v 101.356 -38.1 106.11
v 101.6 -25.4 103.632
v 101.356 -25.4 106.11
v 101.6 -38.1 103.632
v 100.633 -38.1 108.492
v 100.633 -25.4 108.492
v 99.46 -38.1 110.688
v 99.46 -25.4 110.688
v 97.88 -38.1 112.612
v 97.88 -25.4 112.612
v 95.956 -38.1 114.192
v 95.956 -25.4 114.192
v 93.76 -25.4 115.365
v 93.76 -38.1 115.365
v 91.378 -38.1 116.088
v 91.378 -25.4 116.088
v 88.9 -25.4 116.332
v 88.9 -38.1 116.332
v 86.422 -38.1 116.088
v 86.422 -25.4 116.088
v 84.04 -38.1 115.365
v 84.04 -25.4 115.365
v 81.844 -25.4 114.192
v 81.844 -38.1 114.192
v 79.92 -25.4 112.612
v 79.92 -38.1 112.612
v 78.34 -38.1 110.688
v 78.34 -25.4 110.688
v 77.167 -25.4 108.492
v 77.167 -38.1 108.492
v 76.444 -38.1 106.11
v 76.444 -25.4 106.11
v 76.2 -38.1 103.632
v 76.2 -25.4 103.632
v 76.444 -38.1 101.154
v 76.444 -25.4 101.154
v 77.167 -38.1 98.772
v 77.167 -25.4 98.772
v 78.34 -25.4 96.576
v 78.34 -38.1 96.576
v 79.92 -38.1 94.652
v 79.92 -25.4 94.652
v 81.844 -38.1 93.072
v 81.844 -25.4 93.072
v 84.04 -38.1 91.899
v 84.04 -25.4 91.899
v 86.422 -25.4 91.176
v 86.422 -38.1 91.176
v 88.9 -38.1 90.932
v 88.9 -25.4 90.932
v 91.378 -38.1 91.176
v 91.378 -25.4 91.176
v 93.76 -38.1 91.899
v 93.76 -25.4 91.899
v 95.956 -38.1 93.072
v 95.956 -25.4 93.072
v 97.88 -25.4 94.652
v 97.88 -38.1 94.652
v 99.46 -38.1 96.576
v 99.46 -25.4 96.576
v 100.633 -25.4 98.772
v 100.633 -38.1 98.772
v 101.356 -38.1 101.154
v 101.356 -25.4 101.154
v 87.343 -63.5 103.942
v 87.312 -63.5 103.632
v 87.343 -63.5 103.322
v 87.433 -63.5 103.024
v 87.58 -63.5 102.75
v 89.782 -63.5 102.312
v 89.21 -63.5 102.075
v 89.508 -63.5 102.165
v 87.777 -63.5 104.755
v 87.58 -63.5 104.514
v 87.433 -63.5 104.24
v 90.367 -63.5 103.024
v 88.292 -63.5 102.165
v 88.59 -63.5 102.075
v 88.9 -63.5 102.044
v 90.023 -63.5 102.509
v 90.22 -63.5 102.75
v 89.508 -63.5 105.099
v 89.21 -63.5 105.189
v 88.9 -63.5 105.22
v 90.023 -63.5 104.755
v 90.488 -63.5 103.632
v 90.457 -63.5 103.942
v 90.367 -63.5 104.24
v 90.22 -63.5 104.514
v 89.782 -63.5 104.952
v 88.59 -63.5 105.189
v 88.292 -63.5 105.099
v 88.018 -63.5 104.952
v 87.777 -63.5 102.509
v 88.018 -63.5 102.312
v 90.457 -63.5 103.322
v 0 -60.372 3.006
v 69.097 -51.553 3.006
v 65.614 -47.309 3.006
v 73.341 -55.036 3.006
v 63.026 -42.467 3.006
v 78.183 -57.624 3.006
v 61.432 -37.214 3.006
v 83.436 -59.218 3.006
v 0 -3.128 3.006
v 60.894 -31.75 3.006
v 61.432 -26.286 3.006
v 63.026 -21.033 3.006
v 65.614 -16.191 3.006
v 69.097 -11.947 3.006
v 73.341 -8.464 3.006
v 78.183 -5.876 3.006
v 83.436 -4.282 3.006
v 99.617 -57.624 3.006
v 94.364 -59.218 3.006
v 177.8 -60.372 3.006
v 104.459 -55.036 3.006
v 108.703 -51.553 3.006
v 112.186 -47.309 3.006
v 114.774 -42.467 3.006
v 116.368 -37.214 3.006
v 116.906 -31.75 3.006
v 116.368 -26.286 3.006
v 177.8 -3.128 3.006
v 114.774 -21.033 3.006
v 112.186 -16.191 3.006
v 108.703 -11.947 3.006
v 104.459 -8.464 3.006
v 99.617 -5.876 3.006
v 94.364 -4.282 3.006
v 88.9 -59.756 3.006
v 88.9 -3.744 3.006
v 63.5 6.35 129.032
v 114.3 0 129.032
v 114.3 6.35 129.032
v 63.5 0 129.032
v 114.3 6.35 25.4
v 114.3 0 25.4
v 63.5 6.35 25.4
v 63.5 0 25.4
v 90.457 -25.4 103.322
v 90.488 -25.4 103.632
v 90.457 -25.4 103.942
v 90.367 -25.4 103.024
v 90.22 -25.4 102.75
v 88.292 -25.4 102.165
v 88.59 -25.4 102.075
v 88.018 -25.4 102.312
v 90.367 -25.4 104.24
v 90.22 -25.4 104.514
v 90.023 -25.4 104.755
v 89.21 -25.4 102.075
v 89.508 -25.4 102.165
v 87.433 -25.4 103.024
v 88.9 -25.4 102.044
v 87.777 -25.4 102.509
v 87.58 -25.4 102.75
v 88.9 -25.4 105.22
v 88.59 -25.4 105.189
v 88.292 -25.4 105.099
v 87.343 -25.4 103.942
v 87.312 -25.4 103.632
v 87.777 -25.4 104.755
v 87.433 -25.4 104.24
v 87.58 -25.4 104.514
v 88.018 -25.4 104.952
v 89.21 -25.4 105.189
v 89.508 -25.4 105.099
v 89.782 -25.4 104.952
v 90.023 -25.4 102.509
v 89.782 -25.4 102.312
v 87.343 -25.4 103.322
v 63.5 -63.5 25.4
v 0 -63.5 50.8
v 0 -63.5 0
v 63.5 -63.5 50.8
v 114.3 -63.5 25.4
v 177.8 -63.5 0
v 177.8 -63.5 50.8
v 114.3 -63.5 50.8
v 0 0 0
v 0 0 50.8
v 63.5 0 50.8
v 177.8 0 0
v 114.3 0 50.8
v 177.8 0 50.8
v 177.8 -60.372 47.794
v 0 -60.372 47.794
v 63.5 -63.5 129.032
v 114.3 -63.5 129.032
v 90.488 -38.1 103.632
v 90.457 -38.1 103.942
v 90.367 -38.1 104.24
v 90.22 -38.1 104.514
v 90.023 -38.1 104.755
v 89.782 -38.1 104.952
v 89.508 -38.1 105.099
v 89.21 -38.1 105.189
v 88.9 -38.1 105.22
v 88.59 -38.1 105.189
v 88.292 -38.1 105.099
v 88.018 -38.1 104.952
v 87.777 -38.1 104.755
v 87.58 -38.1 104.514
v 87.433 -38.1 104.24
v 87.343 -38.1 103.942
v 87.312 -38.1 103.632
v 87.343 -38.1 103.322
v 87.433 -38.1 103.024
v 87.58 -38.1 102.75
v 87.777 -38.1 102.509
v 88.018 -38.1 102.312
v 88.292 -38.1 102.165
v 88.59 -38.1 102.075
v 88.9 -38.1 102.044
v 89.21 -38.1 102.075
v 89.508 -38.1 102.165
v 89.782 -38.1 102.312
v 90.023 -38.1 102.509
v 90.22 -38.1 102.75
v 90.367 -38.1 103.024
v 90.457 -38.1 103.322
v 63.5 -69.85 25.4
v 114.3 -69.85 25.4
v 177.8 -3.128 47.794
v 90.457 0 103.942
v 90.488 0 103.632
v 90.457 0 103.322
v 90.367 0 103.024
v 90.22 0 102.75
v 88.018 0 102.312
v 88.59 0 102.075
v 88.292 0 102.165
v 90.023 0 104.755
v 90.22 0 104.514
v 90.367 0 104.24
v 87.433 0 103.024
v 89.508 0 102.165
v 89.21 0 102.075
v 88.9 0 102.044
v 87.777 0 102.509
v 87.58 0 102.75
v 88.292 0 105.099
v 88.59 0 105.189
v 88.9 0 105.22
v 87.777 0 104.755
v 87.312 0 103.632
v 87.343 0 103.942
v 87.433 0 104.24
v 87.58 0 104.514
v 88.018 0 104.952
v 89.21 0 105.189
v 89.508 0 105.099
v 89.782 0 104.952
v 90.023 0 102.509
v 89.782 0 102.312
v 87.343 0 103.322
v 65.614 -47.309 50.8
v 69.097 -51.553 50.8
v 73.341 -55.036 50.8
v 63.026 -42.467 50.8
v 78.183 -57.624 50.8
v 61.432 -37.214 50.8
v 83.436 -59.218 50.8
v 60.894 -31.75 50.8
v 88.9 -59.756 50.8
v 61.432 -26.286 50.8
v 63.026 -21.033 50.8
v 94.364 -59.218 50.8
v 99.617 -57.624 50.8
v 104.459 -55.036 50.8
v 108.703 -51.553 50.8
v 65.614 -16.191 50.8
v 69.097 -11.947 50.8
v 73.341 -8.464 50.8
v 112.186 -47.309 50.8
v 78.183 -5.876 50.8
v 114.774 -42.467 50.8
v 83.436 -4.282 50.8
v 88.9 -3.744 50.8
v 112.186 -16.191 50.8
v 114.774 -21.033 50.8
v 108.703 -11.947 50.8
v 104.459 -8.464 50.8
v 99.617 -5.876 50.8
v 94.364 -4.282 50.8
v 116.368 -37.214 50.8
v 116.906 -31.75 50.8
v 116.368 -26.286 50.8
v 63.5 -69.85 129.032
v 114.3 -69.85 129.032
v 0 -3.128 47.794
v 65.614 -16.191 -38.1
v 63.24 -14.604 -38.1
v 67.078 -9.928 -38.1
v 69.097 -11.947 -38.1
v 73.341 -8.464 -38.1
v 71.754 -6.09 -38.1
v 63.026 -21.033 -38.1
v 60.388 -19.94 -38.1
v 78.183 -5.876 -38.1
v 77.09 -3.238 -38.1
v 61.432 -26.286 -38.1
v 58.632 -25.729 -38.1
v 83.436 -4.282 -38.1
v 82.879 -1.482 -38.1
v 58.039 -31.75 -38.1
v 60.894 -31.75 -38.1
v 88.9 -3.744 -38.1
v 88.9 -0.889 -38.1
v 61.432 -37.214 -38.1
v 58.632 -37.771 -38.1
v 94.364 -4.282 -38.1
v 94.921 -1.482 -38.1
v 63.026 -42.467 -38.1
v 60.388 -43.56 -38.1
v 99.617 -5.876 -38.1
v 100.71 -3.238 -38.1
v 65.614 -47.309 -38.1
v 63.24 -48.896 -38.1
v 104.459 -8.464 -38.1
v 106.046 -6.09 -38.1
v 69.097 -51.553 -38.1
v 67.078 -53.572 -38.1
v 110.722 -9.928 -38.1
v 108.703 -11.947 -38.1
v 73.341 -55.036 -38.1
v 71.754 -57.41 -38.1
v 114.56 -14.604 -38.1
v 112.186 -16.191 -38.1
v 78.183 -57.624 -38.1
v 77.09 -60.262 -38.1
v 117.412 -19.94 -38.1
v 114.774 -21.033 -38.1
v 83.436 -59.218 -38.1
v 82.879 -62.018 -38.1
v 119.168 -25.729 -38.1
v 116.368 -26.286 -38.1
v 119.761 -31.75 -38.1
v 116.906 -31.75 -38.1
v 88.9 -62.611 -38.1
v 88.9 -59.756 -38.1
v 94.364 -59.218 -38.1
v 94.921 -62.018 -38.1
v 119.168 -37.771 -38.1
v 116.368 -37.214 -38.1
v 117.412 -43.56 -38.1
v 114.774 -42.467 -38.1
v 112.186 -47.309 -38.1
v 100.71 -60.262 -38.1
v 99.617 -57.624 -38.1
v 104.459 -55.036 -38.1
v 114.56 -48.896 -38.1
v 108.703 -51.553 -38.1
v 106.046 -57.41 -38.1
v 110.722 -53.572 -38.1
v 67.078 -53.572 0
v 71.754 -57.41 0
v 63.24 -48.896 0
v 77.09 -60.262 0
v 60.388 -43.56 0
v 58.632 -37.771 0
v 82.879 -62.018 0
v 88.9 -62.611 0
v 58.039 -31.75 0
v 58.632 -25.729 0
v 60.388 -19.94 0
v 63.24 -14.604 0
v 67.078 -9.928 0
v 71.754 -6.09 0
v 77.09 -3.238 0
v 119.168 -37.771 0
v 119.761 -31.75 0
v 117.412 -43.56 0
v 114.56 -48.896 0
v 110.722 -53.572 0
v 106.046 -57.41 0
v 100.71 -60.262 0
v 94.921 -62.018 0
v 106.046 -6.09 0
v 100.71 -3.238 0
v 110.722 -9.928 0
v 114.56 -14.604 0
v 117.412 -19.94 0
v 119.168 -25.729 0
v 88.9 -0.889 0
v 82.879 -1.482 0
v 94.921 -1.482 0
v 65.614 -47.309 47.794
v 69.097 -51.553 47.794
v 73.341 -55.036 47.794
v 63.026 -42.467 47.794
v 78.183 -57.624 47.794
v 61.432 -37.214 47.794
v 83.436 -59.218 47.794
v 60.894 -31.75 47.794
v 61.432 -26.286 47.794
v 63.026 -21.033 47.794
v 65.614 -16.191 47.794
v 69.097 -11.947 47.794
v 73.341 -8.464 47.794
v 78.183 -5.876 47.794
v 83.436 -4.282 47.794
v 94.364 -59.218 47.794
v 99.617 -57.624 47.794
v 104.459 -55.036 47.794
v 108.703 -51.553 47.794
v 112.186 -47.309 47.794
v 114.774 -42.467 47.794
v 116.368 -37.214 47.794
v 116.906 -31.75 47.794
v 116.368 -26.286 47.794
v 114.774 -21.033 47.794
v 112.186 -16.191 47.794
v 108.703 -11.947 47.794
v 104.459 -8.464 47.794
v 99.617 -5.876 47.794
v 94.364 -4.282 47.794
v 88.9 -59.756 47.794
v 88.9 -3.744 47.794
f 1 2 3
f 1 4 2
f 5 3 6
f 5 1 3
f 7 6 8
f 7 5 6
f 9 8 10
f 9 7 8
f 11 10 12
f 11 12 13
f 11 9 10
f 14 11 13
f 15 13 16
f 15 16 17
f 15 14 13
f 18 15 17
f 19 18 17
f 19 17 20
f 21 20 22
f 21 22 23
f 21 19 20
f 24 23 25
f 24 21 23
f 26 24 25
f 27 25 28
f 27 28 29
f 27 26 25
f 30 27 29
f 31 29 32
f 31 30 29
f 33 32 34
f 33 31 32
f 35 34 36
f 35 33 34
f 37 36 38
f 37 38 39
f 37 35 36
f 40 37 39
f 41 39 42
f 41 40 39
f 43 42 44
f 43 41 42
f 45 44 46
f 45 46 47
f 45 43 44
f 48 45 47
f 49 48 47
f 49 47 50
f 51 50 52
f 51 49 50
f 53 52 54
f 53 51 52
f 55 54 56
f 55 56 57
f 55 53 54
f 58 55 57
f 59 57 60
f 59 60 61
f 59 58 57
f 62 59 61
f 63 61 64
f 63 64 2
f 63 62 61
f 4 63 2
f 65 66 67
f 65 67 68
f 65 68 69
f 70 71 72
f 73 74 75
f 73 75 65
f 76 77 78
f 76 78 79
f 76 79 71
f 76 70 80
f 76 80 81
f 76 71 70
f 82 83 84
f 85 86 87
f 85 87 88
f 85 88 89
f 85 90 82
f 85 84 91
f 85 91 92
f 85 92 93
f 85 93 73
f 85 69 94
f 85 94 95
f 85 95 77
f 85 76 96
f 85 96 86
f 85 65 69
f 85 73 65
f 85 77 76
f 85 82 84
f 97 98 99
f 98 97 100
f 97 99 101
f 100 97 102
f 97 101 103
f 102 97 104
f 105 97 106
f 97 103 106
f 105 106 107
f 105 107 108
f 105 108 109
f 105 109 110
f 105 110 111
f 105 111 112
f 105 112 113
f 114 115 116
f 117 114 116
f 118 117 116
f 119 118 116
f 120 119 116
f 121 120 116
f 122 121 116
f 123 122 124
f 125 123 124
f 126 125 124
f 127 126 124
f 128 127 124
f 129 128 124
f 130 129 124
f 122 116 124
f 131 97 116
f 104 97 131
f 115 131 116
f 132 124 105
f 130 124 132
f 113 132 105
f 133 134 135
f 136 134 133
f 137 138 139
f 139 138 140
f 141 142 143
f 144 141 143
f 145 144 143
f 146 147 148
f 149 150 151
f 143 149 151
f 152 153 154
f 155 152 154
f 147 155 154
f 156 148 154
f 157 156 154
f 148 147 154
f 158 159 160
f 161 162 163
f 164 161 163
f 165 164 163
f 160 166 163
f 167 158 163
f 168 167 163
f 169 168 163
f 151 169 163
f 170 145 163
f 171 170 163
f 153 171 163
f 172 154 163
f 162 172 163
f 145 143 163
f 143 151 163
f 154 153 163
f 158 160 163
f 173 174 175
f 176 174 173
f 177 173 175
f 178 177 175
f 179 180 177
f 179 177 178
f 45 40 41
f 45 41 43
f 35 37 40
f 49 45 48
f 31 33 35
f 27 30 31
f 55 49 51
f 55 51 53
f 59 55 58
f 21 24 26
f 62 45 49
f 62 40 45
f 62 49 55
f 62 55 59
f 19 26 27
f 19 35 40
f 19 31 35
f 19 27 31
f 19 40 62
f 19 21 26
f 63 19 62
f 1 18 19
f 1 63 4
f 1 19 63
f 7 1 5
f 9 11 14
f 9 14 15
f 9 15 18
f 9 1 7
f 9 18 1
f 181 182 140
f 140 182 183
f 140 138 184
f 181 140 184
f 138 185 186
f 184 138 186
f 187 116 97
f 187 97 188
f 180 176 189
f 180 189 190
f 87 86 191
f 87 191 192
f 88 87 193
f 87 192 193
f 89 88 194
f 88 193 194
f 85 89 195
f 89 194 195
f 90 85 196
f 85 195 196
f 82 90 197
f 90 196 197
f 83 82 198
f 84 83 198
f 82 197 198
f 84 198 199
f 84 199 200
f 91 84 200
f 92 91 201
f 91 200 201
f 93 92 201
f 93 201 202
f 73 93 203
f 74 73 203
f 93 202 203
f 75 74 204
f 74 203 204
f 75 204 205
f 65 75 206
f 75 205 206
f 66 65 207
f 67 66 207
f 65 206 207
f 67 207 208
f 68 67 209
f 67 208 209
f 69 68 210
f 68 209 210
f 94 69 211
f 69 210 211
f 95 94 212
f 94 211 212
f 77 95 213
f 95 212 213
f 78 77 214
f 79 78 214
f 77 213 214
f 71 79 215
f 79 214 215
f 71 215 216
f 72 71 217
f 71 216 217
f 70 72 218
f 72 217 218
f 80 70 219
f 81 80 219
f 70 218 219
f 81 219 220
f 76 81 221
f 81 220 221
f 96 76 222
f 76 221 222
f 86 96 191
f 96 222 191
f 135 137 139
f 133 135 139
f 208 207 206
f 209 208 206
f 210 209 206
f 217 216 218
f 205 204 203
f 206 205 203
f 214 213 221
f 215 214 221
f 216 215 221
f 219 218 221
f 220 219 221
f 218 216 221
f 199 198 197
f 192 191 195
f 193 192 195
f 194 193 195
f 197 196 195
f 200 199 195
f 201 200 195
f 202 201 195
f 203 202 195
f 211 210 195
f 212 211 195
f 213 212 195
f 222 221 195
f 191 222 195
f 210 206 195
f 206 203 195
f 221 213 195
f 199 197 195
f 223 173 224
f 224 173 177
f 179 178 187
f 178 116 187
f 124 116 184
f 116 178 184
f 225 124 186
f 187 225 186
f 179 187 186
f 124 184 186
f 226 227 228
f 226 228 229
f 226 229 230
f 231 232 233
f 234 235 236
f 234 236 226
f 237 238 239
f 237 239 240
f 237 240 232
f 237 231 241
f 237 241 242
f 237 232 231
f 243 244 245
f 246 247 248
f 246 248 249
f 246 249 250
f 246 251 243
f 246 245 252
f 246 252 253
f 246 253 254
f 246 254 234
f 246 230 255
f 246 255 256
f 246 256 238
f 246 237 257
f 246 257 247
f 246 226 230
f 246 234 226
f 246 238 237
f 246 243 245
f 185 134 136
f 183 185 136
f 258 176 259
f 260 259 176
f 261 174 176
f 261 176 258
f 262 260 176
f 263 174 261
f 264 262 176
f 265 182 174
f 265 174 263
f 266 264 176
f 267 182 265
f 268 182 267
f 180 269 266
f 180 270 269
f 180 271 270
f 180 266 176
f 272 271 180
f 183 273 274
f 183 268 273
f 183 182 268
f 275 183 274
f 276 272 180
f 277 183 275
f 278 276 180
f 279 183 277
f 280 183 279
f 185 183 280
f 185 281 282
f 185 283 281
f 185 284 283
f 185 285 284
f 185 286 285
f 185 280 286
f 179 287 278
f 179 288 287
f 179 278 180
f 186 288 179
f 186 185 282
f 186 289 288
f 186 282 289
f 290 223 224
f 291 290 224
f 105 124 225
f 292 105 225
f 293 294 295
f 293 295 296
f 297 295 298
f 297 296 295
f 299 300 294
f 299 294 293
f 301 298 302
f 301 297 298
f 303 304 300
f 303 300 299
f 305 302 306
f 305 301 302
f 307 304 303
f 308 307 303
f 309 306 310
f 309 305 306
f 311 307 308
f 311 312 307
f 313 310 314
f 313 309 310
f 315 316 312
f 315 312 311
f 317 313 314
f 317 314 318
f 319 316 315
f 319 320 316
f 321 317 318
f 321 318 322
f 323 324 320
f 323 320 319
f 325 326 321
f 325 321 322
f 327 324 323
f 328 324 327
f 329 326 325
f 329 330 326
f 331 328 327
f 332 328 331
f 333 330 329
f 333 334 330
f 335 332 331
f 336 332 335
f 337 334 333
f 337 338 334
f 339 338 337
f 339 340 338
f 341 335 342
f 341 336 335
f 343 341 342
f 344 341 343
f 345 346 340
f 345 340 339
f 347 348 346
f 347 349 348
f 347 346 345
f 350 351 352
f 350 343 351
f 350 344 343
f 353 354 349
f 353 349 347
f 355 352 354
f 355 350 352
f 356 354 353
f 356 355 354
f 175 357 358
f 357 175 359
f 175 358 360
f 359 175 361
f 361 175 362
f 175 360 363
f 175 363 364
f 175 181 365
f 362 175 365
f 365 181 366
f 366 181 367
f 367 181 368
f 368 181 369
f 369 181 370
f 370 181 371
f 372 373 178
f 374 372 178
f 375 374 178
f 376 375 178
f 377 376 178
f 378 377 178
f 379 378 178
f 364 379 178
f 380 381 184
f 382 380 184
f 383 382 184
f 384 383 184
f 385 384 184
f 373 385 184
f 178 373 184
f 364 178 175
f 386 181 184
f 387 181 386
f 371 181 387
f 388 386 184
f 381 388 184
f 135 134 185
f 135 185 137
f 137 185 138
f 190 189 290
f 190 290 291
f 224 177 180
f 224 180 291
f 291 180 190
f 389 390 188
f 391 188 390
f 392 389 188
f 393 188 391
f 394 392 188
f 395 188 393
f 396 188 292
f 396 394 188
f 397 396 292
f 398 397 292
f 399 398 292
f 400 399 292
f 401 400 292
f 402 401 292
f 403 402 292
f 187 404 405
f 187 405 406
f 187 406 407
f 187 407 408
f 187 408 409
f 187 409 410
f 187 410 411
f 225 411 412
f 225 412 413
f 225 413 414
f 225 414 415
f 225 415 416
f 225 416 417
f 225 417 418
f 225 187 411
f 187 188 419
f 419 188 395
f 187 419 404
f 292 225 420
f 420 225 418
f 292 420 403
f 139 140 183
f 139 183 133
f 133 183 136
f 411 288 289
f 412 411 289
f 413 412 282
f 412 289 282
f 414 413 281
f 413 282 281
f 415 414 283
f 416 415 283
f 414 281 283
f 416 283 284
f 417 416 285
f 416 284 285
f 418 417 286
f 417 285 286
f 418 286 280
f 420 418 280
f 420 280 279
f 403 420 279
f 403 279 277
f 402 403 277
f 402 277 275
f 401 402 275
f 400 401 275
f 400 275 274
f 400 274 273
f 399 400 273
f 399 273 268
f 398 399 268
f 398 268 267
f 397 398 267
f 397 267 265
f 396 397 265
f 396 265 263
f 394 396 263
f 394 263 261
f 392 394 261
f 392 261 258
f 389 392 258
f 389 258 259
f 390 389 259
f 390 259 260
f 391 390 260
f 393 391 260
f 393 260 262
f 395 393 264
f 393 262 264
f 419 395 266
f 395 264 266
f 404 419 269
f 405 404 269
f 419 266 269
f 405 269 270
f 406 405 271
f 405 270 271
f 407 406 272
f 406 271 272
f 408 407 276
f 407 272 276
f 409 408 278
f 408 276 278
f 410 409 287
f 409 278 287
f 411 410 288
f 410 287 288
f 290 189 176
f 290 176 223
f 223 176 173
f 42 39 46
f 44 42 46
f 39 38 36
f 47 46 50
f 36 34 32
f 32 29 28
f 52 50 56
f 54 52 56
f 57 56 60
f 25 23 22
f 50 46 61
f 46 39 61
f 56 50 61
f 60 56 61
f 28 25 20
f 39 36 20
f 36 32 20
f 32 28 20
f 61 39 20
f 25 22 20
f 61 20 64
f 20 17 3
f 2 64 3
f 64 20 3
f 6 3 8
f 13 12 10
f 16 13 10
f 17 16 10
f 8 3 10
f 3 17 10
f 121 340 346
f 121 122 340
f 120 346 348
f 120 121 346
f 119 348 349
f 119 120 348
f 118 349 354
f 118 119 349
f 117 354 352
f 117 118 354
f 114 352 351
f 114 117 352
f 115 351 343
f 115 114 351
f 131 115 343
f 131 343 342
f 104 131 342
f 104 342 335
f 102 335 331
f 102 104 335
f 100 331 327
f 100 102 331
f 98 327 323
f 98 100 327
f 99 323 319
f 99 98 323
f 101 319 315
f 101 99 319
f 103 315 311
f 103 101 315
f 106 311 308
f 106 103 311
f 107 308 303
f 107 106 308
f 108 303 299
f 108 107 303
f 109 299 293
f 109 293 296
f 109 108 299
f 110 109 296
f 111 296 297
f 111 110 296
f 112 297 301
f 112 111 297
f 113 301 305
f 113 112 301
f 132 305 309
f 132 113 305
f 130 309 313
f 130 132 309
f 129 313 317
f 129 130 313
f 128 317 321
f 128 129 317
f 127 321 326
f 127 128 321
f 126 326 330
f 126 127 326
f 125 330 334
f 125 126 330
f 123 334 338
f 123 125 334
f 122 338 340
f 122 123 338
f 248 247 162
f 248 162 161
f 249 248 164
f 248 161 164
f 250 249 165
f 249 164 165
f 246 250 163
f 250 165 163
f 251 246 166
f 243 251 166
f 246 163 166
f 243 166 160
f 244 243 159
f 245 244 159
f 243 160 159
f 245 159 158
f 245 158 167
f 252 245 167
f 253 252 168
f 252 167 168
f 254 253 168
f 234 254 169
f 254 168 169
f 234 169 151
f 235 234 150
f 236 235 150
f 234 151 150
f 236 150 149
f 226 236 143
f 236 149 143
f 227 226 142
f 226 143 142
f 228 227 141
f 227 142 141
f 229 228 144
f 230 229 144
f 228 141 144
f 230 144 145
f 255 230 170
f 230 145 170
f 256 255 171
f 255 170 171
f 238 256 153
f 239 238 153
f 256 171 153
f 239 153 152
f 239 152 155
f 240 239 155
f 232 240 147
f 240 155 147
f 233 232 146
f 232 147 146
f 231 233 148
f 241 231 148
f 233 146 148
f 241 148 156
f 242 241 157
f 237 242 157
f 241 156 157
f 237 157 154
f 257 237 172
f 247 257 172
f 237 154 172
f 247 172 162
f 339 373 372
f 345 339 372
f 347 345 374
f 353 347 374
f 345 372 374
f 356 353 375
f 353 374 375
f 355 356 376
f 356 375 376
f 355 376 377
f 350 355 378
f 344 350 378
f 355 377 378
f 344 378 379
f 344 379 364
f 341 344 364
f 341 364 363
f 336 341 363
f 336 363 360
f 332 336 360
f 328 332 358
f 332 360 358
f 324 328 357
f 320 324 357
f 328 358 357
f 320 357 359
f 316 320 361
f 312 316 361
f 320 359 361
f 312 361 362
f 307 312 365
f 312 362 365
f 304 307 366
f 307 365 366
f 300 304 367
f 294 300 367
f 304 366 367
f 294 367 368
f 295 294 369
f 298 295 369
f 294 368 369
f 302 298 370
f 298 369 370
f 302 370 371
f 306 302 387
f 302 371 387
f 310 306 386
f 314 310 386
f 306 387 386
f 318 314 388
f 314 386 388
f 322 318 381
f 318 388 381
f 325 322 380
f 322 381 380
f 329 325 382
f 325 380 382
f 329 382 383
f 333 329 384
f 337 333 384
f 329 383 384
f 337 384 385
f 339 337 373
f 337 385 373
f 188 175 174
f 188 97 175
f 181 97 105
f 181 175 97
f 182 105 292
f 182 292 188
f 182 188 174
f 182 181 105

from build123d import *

# Parameters (mm, degrees)
F0_W      = 177.8
F0_H      = 50.8
F1_DEPTH  = 63.5
F2_W      = 50.8
F2_H      = 78.232
F3_DEPTH  = 6.35
F4_W      = 50.8
F4_H      = 78.232
F4_H_2    = 25.4
F5_DEPTH  = 6.35
F6_W      = 57.2448244095
F6_H      = 44.7886691809
F7_DEPTH  = 177.8
F8_R      = 28.0061768785
F9_DEPTH  = 50.801
F10_R     = 30.8612642365
F10_R_2   = 28.0061768785
F11_DEPTH = 38.1
F14_R     = 12.7
F15_DEPTH = 6.35
F16_R     = 1.5875
F17_DEPTH = 25.4
F18_R     = 1.5875
F19_DEPTH = 25.4


with BuildPart() as f1:
    # F0 (on Front) → F1 (new body)
    with BuildSketch(Plane.XZ):
        with Locations((88.9, 25.4)):
            Rectangle(F0_W, F0_H)
    extrude(amount=F1_DEPTH)

    # F2 (on face) → F3 (join)
    with BuildSketch(Plane.XZ.offset(63.5)):
        with Locations((88.9, 89.916)):
            Rectangle(F2_W, F2_H)
        Polygon((63.5, 25.4), (88.9, 25.4), (114.3, 25.4), (114.3, 50.8), (63.5, 50.8), align=None)
    extrude(amount=F3_DEPTH)

    # F4 (on face) → F5 (join)
    with BuildSketch(Plane(origin=(0, 0, 0), x_dir=(-1, 0, 0), z_dir=(0, 1, 0))):
        with Locations((-88.9, 89.916)):
            Rectangle(F4_W, F4_H)
        with Locations((-88.9, 38.1)):
            Rectangle(F4_W, F4_H_2)
    extrude(amount=F5_DEPTH)

    # F6 (on face) → F7 (cut, through all)
    with BuildSketch(Plane.YZ.offset(177.8)):
        with Locations((-31.75, 25.4)):
            Rectangle(F6_W, F6_H)
    extrude(amount=-F7_DEPTH, mode=Mode.SUBTRACT)

    # F8 (on face) → F9 (cut, through all)
    with BuildSketch(Plane.XY.offset(50.8)):
        with Locations((88.9, -31.75)):
            Circle(F8_R)
    extrude(amount=-F9_DEPTH, mode=Mode.SUBTRACT)

    # F10 (on face) → F11 (join)
    with BuildSketch(Plane(origin=(0, 0, 0), x_dir=(1, 0, 0), z_dir=(0, 0, -1))):
        with Locations((88.9, 31.75)):
            Circle(F10_R)
        with Locations((88.9, 31.75)):
            Circle(F10_R_2, mode=Mode.SUBTRACT)
    extrude(amount=F11_DEPTH)


with BuildPart() as f15:
    # F14 (on plane+point) → F15 (new body, symmetric)
    with BuildSketch(Plane.XZ.offset(31.75)):
        with Locations((88.9, 103.632)):
            Circle(F14_R)
    extrude(amount=F15_DEPTH, both=True)


with BuildPart() as f17:
    # F16 (on face) → F17 (new body, through all)
    with BuildSketch(Plane(origin=(0, -25.4, 0), x_dir=(-1, 0, 0), z_dir=(0, 1, 0))):
        with Locations((-88.9, 103.632)):
            Circle(F16_R)
    extrude(amount=F17_DEPTH)


with BuildPart() as f19:
    # F18 (on face) → F19 (new body, through all)
    with BuildSketch(Plane.XZ.offset(38.1)):
        with Locations((88.9, 103.632)):
            Circle(F18_R)
    extrude(amount=F19_DEPTH)


solid = Compound([f1.part, f15.part, f17.part, f19.part])
